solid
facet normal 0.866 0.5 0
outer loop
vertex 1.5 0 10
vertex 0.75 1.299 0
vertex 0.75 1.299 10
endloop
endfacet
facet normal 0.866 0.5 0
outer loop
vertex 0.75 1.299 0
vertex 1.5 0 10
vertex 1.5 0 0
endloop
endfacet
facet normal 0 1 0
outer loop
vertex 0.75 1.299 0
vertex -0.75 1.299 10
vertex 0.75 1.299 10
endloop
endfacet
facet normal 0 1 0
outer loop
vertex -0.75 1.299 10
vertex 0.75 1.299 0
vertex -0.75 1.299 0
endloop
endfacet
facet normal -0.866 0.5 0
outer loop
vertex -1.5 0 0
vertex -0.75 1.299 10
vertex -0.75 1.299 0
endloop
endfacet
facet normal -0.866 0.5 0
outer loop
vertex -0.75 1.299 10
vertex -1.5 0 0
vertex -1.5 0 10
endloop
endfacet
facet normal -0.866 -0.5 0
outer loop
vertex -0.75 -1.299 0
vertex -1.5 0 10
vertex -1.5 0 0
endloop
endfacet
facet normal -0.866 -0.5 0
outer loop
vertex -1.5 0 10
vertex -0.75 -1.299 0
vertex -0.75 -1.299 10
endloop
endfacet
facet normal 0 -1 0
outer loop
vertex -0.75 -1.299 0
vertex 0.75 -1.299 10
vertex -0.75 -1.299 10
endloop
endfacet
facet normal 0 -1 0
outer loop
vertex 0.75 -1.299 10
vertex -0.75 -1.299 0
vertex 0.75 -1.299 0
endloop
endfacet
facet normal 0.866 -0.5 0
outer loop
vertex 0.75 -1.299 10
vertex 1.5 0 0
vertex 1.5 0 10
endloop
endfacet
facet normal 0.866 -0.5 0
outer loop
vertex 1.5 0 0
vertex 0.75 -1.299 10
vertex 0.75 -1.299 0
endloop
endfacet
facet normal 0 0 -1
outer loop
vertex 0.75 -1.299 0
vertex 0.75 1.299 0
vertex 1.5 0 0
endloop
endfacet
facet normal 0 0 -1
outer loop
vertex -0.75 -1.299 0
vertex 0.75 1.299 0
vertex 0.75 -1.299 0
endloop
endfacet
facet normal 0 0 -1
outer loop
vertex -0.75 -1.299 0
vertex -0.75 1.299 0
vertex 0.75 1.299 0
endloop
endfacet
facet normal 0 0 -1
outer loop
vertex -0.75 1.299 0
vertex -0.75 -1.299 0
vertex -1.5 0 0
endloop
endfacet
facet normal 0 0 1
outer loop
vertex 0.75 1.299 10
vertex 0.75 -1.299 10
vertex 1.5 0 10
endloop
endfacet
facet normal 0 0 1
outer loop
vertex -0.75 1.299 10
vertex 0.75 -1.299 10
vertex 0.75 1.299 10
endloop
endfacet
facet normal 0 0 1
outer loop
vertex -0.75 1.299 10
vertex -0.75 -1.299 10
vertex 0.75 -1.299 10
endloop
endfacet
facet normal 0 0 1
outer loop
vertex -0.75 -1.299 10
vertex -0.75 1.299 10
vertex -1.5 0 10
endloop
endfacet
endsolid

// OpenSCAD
module M3_hole( pos=[0, 0, 0], depth = 10, invert=false) {
    color("cyan")
    translate( pos)
    if( invert) {
        rotate([180, 0, 0])
        cylinder(r1=1.5, r2=1.5, depth, center=false, $fn=6);
    }
    else {
        cylinder(r1=1.5, r2=1.5, depth, center=false, $fn=6);
    }
}

M3_hole();
